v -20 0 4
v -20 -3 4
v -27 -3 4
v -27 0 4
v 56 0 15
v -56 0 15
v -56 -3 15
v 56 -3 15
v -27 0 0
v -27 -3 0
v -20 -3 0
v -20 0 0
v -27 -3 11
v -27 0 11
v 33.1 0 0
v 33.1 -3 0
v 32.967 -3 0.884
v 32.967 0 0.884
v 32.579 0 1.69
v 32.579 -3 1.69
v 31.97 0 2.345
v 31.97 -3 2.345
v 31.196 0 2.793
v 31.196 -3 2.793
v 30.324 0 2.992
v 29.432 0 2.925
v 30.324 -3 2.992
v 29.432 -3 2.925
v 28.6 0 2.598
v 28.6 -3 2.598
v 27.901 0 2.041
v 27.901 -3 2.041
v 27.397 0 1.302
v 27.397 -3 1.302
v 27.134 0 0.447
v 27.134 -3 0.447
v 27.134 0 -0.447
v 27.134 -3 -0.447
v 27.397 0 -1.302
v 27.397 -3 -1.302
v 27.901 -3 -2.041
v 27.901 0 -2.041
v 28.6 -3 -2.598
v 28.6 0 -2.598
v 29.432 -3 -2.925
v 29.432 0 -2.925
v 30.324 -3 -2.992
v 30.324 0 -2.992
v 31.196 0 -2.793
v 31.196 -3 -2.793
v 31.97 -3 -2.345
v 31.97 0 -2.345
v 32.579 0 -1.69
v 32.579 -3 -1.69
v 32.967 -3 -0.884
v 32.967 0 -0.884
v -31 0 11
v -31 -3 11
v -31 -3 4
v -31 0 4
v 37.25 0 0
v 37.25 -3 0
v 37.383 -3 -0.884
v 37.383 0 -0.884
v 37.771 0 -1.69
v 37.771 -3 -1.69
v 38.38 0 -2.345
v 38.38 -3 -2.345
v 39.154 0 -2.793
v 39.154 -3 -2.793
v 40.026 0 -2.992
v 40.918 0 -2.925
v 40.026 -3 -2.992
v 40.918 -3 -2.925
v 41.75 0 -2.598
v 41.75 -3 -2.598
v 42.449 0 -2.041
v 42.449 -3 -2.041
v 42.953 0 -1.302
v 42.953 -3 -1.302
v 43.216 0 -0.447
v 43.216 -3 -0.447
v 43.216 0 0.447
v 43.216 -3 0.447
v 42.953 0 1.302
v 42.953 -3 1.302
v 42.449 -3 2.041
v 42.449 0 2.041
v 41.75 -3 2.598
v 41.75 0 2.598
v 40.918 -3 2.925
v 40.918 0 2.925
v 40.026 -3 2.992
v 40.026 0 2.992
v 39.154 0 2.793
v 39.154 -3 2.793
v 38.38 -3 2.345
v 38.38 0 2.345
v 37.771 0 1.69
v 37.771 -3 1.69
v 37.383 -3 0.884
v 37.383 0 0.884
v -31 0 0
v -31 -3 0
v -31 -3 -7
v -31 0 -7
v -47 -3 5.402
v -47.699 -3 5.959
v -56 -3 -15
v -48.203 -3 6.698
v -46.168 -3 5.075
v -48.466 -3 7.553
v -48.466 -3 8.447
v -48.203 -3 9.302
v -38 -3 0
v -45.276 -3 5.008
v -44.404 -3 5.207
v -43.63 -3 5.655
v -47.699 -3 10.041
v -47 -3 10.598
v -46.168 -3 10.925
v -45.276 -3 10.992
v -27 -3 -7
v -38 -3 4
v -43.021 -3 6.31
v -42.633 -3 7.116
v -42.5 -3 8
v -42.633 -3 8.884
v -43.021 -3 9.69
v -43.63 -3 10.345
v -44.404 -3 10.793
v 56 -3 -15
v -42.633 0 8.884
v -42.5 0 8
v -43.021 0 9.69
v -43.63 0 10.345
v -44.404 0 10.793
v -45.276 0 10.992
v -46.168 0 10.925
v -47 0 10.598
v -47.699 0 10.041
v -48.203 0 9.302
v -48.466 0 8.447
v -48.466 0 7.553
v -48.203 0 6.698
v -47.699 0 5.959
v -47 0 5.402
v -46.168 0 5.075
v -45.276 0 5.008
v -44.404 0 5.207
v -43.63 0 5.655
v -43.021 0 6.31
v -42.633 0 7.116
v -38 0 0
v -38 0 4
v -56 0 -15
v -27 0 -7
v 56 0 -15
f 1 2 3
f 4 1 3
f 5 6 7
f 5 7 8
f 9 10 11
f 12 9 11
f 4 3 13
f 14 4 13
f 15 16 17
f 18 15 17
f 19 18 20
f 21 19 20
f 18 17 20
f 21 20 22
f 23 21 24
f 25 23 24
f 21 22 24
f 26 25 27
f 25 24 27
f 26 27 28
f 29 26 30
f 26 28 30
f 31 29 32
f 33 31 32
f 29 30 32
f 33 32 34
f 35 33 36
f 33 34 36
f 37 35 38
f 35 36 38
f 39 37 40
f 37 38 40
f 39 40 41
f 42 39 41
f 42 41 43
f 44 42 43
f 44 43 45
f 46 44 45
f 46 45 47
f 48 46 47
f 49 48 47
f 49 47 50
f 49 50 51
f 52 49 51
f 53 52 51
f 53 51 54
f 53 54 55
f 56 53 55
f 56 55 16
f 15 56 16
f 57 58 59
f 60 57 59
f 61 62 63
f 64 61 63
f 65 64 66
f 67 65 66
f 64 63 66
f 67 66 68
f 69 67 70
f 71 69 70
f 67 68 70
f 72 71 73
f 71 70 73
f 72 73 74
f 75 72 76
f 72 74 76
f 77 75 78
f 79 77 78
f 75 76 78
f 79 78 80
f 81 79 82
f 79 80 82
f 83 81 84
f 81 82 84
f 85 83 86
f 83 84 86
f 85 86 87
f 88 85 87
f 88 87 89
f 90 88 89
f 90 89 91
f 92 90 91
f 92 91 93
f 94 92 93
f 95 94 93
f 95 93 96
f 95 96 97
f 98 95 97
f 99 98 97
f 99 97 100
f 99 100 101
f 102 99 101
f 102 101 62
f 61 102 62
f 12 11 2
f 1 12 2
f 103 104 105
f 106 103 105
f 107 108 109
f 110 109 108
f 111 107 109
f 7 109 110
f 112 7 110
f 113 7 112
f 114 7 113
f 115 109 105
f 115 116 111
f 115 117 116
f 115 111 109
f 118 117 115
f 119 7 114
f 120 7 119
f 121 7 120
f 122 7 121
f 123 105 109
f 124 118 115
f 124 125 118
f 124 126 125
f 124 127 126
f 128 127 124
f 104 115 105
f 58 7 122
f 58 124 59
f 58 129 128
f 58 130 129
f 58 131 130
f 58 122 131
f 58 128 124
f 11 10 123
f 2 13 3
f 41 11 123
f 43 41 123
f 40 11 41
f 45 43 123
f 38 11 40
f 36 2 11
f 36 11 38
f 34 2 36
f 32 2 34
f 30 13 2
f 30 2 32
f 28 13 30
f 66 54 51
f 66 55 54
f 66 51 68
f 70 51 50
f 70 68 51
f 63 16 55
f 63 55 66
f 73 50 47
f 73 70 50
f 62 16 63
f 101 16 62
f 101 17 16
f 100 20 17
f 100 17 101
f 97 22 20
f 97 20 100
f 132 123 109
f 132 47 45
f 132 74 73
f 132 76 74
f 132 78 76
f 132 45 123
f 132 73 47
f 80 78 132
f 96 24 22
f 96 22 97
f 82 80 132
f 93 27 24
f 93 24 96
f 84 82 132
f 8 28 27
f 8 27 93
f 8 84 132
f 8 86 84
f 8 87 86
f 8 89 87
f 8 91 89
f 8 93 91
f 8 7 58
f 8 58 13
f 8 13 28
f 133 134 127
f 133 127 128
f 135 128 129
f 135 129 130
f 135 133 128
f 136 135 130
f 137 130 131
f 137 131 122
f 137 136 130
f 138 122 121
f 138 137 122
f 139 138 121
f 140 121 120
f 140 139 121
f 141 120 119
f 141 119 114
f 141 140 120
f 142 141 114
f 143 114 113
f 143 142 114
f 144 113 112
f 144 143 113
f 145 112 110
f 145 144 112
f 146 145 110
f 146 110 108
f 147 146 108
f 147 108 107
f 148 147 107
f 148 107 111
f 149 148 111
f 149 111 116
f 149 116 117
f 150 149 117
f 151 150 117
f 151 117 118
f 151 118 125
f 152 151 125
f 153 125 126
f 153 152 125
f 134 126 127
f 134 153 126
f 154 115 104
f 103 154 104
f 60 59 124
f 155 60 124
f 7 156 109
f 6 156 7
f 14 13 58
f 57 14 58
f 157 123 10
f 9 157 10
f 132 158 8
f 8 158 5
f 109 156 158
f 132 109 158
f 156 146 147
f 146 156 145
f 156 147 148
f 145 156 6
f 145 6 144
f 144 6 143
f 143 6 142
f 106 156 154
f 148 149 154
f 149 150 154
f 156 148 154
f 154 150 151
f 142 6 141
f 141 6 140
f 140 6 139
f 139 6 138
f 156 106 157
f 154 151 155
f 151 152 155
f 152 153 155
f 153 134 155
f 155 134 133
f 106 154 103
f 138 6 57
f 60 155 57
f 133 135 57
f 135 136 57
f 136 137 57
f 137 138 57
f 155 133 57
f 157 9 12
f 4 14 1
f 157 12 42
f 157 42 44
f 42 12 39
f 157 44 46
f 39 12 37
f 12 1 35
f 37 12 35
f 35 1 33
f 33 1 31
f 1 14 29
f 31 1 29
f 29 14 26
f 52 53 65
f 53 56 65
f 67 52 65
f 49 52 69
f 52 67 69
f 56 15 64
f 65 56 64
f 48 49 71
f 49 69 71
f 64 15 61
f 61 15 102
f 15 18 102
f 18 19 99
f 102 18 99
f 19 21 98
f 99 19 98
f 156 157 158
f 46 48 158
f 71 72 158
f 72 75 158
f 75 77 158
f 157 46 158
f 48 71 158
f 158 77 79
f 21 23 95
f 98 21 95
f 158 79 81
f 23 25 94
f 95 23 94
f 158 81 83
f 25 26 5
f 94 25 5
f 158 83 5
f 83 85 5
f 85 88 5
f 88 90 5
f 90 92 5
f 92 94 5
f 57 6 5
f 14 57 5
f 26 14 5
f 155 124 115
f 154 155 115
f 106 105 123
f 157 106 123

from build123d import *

# Parameters (mm, degrees)
F0_W     = 112
F0_H     = 30
F0_R     = 3
F1_DEPTH = 3
F3_DEPTH = 25
F4_R     = 3
F5_DEPTH = 25


with BuildPart() as f1:
    # F0 (on Front) → F1 (new body)
    with BuildSketch(Plane.XZ):
        Rectangle(F0_W, F0_H)
        with Locations((-45.5, 8)):
            Circle(F0_R, mode=Mode.SUBTRACT)
    extrude(amount=F1_DEPTH)

    # F2 (on face) → F3 (cut)
    with BuildSketch(Plane.XZ.offset(3)):
        Polygon((-38, 4), (-38, 2), (-38, 0), (-31, 0), (-31, -7), (-29, -7), (-27, -7), (-27, 0), (-20, 0), (-20, 2), (-20, 4), (-27, 4), (-27, 11), (-29, 11), (-31, 11), (-31, 4), align=None)
    extrude(amount=-F3_DEPTH, mode=Mode.SUBTRACT)

    # F4 (on face) → F5 (cut)
    with BuildSketch(Plane.XZ.offset(3)):
        with Locations((30.1, 0)):
            Circle(F4_R)
        with BuildLine():
            ThreePointArc((43.25, 0), (40.25, 3), (37.25, 0))
            ThreePointArc((37.25, 0), (40.25, -3), (43.25, 0))
        make_face()
    extrude(amount=-F5_DEPTH, mode=Mode.SUBTRACT)


solid = f1.part
